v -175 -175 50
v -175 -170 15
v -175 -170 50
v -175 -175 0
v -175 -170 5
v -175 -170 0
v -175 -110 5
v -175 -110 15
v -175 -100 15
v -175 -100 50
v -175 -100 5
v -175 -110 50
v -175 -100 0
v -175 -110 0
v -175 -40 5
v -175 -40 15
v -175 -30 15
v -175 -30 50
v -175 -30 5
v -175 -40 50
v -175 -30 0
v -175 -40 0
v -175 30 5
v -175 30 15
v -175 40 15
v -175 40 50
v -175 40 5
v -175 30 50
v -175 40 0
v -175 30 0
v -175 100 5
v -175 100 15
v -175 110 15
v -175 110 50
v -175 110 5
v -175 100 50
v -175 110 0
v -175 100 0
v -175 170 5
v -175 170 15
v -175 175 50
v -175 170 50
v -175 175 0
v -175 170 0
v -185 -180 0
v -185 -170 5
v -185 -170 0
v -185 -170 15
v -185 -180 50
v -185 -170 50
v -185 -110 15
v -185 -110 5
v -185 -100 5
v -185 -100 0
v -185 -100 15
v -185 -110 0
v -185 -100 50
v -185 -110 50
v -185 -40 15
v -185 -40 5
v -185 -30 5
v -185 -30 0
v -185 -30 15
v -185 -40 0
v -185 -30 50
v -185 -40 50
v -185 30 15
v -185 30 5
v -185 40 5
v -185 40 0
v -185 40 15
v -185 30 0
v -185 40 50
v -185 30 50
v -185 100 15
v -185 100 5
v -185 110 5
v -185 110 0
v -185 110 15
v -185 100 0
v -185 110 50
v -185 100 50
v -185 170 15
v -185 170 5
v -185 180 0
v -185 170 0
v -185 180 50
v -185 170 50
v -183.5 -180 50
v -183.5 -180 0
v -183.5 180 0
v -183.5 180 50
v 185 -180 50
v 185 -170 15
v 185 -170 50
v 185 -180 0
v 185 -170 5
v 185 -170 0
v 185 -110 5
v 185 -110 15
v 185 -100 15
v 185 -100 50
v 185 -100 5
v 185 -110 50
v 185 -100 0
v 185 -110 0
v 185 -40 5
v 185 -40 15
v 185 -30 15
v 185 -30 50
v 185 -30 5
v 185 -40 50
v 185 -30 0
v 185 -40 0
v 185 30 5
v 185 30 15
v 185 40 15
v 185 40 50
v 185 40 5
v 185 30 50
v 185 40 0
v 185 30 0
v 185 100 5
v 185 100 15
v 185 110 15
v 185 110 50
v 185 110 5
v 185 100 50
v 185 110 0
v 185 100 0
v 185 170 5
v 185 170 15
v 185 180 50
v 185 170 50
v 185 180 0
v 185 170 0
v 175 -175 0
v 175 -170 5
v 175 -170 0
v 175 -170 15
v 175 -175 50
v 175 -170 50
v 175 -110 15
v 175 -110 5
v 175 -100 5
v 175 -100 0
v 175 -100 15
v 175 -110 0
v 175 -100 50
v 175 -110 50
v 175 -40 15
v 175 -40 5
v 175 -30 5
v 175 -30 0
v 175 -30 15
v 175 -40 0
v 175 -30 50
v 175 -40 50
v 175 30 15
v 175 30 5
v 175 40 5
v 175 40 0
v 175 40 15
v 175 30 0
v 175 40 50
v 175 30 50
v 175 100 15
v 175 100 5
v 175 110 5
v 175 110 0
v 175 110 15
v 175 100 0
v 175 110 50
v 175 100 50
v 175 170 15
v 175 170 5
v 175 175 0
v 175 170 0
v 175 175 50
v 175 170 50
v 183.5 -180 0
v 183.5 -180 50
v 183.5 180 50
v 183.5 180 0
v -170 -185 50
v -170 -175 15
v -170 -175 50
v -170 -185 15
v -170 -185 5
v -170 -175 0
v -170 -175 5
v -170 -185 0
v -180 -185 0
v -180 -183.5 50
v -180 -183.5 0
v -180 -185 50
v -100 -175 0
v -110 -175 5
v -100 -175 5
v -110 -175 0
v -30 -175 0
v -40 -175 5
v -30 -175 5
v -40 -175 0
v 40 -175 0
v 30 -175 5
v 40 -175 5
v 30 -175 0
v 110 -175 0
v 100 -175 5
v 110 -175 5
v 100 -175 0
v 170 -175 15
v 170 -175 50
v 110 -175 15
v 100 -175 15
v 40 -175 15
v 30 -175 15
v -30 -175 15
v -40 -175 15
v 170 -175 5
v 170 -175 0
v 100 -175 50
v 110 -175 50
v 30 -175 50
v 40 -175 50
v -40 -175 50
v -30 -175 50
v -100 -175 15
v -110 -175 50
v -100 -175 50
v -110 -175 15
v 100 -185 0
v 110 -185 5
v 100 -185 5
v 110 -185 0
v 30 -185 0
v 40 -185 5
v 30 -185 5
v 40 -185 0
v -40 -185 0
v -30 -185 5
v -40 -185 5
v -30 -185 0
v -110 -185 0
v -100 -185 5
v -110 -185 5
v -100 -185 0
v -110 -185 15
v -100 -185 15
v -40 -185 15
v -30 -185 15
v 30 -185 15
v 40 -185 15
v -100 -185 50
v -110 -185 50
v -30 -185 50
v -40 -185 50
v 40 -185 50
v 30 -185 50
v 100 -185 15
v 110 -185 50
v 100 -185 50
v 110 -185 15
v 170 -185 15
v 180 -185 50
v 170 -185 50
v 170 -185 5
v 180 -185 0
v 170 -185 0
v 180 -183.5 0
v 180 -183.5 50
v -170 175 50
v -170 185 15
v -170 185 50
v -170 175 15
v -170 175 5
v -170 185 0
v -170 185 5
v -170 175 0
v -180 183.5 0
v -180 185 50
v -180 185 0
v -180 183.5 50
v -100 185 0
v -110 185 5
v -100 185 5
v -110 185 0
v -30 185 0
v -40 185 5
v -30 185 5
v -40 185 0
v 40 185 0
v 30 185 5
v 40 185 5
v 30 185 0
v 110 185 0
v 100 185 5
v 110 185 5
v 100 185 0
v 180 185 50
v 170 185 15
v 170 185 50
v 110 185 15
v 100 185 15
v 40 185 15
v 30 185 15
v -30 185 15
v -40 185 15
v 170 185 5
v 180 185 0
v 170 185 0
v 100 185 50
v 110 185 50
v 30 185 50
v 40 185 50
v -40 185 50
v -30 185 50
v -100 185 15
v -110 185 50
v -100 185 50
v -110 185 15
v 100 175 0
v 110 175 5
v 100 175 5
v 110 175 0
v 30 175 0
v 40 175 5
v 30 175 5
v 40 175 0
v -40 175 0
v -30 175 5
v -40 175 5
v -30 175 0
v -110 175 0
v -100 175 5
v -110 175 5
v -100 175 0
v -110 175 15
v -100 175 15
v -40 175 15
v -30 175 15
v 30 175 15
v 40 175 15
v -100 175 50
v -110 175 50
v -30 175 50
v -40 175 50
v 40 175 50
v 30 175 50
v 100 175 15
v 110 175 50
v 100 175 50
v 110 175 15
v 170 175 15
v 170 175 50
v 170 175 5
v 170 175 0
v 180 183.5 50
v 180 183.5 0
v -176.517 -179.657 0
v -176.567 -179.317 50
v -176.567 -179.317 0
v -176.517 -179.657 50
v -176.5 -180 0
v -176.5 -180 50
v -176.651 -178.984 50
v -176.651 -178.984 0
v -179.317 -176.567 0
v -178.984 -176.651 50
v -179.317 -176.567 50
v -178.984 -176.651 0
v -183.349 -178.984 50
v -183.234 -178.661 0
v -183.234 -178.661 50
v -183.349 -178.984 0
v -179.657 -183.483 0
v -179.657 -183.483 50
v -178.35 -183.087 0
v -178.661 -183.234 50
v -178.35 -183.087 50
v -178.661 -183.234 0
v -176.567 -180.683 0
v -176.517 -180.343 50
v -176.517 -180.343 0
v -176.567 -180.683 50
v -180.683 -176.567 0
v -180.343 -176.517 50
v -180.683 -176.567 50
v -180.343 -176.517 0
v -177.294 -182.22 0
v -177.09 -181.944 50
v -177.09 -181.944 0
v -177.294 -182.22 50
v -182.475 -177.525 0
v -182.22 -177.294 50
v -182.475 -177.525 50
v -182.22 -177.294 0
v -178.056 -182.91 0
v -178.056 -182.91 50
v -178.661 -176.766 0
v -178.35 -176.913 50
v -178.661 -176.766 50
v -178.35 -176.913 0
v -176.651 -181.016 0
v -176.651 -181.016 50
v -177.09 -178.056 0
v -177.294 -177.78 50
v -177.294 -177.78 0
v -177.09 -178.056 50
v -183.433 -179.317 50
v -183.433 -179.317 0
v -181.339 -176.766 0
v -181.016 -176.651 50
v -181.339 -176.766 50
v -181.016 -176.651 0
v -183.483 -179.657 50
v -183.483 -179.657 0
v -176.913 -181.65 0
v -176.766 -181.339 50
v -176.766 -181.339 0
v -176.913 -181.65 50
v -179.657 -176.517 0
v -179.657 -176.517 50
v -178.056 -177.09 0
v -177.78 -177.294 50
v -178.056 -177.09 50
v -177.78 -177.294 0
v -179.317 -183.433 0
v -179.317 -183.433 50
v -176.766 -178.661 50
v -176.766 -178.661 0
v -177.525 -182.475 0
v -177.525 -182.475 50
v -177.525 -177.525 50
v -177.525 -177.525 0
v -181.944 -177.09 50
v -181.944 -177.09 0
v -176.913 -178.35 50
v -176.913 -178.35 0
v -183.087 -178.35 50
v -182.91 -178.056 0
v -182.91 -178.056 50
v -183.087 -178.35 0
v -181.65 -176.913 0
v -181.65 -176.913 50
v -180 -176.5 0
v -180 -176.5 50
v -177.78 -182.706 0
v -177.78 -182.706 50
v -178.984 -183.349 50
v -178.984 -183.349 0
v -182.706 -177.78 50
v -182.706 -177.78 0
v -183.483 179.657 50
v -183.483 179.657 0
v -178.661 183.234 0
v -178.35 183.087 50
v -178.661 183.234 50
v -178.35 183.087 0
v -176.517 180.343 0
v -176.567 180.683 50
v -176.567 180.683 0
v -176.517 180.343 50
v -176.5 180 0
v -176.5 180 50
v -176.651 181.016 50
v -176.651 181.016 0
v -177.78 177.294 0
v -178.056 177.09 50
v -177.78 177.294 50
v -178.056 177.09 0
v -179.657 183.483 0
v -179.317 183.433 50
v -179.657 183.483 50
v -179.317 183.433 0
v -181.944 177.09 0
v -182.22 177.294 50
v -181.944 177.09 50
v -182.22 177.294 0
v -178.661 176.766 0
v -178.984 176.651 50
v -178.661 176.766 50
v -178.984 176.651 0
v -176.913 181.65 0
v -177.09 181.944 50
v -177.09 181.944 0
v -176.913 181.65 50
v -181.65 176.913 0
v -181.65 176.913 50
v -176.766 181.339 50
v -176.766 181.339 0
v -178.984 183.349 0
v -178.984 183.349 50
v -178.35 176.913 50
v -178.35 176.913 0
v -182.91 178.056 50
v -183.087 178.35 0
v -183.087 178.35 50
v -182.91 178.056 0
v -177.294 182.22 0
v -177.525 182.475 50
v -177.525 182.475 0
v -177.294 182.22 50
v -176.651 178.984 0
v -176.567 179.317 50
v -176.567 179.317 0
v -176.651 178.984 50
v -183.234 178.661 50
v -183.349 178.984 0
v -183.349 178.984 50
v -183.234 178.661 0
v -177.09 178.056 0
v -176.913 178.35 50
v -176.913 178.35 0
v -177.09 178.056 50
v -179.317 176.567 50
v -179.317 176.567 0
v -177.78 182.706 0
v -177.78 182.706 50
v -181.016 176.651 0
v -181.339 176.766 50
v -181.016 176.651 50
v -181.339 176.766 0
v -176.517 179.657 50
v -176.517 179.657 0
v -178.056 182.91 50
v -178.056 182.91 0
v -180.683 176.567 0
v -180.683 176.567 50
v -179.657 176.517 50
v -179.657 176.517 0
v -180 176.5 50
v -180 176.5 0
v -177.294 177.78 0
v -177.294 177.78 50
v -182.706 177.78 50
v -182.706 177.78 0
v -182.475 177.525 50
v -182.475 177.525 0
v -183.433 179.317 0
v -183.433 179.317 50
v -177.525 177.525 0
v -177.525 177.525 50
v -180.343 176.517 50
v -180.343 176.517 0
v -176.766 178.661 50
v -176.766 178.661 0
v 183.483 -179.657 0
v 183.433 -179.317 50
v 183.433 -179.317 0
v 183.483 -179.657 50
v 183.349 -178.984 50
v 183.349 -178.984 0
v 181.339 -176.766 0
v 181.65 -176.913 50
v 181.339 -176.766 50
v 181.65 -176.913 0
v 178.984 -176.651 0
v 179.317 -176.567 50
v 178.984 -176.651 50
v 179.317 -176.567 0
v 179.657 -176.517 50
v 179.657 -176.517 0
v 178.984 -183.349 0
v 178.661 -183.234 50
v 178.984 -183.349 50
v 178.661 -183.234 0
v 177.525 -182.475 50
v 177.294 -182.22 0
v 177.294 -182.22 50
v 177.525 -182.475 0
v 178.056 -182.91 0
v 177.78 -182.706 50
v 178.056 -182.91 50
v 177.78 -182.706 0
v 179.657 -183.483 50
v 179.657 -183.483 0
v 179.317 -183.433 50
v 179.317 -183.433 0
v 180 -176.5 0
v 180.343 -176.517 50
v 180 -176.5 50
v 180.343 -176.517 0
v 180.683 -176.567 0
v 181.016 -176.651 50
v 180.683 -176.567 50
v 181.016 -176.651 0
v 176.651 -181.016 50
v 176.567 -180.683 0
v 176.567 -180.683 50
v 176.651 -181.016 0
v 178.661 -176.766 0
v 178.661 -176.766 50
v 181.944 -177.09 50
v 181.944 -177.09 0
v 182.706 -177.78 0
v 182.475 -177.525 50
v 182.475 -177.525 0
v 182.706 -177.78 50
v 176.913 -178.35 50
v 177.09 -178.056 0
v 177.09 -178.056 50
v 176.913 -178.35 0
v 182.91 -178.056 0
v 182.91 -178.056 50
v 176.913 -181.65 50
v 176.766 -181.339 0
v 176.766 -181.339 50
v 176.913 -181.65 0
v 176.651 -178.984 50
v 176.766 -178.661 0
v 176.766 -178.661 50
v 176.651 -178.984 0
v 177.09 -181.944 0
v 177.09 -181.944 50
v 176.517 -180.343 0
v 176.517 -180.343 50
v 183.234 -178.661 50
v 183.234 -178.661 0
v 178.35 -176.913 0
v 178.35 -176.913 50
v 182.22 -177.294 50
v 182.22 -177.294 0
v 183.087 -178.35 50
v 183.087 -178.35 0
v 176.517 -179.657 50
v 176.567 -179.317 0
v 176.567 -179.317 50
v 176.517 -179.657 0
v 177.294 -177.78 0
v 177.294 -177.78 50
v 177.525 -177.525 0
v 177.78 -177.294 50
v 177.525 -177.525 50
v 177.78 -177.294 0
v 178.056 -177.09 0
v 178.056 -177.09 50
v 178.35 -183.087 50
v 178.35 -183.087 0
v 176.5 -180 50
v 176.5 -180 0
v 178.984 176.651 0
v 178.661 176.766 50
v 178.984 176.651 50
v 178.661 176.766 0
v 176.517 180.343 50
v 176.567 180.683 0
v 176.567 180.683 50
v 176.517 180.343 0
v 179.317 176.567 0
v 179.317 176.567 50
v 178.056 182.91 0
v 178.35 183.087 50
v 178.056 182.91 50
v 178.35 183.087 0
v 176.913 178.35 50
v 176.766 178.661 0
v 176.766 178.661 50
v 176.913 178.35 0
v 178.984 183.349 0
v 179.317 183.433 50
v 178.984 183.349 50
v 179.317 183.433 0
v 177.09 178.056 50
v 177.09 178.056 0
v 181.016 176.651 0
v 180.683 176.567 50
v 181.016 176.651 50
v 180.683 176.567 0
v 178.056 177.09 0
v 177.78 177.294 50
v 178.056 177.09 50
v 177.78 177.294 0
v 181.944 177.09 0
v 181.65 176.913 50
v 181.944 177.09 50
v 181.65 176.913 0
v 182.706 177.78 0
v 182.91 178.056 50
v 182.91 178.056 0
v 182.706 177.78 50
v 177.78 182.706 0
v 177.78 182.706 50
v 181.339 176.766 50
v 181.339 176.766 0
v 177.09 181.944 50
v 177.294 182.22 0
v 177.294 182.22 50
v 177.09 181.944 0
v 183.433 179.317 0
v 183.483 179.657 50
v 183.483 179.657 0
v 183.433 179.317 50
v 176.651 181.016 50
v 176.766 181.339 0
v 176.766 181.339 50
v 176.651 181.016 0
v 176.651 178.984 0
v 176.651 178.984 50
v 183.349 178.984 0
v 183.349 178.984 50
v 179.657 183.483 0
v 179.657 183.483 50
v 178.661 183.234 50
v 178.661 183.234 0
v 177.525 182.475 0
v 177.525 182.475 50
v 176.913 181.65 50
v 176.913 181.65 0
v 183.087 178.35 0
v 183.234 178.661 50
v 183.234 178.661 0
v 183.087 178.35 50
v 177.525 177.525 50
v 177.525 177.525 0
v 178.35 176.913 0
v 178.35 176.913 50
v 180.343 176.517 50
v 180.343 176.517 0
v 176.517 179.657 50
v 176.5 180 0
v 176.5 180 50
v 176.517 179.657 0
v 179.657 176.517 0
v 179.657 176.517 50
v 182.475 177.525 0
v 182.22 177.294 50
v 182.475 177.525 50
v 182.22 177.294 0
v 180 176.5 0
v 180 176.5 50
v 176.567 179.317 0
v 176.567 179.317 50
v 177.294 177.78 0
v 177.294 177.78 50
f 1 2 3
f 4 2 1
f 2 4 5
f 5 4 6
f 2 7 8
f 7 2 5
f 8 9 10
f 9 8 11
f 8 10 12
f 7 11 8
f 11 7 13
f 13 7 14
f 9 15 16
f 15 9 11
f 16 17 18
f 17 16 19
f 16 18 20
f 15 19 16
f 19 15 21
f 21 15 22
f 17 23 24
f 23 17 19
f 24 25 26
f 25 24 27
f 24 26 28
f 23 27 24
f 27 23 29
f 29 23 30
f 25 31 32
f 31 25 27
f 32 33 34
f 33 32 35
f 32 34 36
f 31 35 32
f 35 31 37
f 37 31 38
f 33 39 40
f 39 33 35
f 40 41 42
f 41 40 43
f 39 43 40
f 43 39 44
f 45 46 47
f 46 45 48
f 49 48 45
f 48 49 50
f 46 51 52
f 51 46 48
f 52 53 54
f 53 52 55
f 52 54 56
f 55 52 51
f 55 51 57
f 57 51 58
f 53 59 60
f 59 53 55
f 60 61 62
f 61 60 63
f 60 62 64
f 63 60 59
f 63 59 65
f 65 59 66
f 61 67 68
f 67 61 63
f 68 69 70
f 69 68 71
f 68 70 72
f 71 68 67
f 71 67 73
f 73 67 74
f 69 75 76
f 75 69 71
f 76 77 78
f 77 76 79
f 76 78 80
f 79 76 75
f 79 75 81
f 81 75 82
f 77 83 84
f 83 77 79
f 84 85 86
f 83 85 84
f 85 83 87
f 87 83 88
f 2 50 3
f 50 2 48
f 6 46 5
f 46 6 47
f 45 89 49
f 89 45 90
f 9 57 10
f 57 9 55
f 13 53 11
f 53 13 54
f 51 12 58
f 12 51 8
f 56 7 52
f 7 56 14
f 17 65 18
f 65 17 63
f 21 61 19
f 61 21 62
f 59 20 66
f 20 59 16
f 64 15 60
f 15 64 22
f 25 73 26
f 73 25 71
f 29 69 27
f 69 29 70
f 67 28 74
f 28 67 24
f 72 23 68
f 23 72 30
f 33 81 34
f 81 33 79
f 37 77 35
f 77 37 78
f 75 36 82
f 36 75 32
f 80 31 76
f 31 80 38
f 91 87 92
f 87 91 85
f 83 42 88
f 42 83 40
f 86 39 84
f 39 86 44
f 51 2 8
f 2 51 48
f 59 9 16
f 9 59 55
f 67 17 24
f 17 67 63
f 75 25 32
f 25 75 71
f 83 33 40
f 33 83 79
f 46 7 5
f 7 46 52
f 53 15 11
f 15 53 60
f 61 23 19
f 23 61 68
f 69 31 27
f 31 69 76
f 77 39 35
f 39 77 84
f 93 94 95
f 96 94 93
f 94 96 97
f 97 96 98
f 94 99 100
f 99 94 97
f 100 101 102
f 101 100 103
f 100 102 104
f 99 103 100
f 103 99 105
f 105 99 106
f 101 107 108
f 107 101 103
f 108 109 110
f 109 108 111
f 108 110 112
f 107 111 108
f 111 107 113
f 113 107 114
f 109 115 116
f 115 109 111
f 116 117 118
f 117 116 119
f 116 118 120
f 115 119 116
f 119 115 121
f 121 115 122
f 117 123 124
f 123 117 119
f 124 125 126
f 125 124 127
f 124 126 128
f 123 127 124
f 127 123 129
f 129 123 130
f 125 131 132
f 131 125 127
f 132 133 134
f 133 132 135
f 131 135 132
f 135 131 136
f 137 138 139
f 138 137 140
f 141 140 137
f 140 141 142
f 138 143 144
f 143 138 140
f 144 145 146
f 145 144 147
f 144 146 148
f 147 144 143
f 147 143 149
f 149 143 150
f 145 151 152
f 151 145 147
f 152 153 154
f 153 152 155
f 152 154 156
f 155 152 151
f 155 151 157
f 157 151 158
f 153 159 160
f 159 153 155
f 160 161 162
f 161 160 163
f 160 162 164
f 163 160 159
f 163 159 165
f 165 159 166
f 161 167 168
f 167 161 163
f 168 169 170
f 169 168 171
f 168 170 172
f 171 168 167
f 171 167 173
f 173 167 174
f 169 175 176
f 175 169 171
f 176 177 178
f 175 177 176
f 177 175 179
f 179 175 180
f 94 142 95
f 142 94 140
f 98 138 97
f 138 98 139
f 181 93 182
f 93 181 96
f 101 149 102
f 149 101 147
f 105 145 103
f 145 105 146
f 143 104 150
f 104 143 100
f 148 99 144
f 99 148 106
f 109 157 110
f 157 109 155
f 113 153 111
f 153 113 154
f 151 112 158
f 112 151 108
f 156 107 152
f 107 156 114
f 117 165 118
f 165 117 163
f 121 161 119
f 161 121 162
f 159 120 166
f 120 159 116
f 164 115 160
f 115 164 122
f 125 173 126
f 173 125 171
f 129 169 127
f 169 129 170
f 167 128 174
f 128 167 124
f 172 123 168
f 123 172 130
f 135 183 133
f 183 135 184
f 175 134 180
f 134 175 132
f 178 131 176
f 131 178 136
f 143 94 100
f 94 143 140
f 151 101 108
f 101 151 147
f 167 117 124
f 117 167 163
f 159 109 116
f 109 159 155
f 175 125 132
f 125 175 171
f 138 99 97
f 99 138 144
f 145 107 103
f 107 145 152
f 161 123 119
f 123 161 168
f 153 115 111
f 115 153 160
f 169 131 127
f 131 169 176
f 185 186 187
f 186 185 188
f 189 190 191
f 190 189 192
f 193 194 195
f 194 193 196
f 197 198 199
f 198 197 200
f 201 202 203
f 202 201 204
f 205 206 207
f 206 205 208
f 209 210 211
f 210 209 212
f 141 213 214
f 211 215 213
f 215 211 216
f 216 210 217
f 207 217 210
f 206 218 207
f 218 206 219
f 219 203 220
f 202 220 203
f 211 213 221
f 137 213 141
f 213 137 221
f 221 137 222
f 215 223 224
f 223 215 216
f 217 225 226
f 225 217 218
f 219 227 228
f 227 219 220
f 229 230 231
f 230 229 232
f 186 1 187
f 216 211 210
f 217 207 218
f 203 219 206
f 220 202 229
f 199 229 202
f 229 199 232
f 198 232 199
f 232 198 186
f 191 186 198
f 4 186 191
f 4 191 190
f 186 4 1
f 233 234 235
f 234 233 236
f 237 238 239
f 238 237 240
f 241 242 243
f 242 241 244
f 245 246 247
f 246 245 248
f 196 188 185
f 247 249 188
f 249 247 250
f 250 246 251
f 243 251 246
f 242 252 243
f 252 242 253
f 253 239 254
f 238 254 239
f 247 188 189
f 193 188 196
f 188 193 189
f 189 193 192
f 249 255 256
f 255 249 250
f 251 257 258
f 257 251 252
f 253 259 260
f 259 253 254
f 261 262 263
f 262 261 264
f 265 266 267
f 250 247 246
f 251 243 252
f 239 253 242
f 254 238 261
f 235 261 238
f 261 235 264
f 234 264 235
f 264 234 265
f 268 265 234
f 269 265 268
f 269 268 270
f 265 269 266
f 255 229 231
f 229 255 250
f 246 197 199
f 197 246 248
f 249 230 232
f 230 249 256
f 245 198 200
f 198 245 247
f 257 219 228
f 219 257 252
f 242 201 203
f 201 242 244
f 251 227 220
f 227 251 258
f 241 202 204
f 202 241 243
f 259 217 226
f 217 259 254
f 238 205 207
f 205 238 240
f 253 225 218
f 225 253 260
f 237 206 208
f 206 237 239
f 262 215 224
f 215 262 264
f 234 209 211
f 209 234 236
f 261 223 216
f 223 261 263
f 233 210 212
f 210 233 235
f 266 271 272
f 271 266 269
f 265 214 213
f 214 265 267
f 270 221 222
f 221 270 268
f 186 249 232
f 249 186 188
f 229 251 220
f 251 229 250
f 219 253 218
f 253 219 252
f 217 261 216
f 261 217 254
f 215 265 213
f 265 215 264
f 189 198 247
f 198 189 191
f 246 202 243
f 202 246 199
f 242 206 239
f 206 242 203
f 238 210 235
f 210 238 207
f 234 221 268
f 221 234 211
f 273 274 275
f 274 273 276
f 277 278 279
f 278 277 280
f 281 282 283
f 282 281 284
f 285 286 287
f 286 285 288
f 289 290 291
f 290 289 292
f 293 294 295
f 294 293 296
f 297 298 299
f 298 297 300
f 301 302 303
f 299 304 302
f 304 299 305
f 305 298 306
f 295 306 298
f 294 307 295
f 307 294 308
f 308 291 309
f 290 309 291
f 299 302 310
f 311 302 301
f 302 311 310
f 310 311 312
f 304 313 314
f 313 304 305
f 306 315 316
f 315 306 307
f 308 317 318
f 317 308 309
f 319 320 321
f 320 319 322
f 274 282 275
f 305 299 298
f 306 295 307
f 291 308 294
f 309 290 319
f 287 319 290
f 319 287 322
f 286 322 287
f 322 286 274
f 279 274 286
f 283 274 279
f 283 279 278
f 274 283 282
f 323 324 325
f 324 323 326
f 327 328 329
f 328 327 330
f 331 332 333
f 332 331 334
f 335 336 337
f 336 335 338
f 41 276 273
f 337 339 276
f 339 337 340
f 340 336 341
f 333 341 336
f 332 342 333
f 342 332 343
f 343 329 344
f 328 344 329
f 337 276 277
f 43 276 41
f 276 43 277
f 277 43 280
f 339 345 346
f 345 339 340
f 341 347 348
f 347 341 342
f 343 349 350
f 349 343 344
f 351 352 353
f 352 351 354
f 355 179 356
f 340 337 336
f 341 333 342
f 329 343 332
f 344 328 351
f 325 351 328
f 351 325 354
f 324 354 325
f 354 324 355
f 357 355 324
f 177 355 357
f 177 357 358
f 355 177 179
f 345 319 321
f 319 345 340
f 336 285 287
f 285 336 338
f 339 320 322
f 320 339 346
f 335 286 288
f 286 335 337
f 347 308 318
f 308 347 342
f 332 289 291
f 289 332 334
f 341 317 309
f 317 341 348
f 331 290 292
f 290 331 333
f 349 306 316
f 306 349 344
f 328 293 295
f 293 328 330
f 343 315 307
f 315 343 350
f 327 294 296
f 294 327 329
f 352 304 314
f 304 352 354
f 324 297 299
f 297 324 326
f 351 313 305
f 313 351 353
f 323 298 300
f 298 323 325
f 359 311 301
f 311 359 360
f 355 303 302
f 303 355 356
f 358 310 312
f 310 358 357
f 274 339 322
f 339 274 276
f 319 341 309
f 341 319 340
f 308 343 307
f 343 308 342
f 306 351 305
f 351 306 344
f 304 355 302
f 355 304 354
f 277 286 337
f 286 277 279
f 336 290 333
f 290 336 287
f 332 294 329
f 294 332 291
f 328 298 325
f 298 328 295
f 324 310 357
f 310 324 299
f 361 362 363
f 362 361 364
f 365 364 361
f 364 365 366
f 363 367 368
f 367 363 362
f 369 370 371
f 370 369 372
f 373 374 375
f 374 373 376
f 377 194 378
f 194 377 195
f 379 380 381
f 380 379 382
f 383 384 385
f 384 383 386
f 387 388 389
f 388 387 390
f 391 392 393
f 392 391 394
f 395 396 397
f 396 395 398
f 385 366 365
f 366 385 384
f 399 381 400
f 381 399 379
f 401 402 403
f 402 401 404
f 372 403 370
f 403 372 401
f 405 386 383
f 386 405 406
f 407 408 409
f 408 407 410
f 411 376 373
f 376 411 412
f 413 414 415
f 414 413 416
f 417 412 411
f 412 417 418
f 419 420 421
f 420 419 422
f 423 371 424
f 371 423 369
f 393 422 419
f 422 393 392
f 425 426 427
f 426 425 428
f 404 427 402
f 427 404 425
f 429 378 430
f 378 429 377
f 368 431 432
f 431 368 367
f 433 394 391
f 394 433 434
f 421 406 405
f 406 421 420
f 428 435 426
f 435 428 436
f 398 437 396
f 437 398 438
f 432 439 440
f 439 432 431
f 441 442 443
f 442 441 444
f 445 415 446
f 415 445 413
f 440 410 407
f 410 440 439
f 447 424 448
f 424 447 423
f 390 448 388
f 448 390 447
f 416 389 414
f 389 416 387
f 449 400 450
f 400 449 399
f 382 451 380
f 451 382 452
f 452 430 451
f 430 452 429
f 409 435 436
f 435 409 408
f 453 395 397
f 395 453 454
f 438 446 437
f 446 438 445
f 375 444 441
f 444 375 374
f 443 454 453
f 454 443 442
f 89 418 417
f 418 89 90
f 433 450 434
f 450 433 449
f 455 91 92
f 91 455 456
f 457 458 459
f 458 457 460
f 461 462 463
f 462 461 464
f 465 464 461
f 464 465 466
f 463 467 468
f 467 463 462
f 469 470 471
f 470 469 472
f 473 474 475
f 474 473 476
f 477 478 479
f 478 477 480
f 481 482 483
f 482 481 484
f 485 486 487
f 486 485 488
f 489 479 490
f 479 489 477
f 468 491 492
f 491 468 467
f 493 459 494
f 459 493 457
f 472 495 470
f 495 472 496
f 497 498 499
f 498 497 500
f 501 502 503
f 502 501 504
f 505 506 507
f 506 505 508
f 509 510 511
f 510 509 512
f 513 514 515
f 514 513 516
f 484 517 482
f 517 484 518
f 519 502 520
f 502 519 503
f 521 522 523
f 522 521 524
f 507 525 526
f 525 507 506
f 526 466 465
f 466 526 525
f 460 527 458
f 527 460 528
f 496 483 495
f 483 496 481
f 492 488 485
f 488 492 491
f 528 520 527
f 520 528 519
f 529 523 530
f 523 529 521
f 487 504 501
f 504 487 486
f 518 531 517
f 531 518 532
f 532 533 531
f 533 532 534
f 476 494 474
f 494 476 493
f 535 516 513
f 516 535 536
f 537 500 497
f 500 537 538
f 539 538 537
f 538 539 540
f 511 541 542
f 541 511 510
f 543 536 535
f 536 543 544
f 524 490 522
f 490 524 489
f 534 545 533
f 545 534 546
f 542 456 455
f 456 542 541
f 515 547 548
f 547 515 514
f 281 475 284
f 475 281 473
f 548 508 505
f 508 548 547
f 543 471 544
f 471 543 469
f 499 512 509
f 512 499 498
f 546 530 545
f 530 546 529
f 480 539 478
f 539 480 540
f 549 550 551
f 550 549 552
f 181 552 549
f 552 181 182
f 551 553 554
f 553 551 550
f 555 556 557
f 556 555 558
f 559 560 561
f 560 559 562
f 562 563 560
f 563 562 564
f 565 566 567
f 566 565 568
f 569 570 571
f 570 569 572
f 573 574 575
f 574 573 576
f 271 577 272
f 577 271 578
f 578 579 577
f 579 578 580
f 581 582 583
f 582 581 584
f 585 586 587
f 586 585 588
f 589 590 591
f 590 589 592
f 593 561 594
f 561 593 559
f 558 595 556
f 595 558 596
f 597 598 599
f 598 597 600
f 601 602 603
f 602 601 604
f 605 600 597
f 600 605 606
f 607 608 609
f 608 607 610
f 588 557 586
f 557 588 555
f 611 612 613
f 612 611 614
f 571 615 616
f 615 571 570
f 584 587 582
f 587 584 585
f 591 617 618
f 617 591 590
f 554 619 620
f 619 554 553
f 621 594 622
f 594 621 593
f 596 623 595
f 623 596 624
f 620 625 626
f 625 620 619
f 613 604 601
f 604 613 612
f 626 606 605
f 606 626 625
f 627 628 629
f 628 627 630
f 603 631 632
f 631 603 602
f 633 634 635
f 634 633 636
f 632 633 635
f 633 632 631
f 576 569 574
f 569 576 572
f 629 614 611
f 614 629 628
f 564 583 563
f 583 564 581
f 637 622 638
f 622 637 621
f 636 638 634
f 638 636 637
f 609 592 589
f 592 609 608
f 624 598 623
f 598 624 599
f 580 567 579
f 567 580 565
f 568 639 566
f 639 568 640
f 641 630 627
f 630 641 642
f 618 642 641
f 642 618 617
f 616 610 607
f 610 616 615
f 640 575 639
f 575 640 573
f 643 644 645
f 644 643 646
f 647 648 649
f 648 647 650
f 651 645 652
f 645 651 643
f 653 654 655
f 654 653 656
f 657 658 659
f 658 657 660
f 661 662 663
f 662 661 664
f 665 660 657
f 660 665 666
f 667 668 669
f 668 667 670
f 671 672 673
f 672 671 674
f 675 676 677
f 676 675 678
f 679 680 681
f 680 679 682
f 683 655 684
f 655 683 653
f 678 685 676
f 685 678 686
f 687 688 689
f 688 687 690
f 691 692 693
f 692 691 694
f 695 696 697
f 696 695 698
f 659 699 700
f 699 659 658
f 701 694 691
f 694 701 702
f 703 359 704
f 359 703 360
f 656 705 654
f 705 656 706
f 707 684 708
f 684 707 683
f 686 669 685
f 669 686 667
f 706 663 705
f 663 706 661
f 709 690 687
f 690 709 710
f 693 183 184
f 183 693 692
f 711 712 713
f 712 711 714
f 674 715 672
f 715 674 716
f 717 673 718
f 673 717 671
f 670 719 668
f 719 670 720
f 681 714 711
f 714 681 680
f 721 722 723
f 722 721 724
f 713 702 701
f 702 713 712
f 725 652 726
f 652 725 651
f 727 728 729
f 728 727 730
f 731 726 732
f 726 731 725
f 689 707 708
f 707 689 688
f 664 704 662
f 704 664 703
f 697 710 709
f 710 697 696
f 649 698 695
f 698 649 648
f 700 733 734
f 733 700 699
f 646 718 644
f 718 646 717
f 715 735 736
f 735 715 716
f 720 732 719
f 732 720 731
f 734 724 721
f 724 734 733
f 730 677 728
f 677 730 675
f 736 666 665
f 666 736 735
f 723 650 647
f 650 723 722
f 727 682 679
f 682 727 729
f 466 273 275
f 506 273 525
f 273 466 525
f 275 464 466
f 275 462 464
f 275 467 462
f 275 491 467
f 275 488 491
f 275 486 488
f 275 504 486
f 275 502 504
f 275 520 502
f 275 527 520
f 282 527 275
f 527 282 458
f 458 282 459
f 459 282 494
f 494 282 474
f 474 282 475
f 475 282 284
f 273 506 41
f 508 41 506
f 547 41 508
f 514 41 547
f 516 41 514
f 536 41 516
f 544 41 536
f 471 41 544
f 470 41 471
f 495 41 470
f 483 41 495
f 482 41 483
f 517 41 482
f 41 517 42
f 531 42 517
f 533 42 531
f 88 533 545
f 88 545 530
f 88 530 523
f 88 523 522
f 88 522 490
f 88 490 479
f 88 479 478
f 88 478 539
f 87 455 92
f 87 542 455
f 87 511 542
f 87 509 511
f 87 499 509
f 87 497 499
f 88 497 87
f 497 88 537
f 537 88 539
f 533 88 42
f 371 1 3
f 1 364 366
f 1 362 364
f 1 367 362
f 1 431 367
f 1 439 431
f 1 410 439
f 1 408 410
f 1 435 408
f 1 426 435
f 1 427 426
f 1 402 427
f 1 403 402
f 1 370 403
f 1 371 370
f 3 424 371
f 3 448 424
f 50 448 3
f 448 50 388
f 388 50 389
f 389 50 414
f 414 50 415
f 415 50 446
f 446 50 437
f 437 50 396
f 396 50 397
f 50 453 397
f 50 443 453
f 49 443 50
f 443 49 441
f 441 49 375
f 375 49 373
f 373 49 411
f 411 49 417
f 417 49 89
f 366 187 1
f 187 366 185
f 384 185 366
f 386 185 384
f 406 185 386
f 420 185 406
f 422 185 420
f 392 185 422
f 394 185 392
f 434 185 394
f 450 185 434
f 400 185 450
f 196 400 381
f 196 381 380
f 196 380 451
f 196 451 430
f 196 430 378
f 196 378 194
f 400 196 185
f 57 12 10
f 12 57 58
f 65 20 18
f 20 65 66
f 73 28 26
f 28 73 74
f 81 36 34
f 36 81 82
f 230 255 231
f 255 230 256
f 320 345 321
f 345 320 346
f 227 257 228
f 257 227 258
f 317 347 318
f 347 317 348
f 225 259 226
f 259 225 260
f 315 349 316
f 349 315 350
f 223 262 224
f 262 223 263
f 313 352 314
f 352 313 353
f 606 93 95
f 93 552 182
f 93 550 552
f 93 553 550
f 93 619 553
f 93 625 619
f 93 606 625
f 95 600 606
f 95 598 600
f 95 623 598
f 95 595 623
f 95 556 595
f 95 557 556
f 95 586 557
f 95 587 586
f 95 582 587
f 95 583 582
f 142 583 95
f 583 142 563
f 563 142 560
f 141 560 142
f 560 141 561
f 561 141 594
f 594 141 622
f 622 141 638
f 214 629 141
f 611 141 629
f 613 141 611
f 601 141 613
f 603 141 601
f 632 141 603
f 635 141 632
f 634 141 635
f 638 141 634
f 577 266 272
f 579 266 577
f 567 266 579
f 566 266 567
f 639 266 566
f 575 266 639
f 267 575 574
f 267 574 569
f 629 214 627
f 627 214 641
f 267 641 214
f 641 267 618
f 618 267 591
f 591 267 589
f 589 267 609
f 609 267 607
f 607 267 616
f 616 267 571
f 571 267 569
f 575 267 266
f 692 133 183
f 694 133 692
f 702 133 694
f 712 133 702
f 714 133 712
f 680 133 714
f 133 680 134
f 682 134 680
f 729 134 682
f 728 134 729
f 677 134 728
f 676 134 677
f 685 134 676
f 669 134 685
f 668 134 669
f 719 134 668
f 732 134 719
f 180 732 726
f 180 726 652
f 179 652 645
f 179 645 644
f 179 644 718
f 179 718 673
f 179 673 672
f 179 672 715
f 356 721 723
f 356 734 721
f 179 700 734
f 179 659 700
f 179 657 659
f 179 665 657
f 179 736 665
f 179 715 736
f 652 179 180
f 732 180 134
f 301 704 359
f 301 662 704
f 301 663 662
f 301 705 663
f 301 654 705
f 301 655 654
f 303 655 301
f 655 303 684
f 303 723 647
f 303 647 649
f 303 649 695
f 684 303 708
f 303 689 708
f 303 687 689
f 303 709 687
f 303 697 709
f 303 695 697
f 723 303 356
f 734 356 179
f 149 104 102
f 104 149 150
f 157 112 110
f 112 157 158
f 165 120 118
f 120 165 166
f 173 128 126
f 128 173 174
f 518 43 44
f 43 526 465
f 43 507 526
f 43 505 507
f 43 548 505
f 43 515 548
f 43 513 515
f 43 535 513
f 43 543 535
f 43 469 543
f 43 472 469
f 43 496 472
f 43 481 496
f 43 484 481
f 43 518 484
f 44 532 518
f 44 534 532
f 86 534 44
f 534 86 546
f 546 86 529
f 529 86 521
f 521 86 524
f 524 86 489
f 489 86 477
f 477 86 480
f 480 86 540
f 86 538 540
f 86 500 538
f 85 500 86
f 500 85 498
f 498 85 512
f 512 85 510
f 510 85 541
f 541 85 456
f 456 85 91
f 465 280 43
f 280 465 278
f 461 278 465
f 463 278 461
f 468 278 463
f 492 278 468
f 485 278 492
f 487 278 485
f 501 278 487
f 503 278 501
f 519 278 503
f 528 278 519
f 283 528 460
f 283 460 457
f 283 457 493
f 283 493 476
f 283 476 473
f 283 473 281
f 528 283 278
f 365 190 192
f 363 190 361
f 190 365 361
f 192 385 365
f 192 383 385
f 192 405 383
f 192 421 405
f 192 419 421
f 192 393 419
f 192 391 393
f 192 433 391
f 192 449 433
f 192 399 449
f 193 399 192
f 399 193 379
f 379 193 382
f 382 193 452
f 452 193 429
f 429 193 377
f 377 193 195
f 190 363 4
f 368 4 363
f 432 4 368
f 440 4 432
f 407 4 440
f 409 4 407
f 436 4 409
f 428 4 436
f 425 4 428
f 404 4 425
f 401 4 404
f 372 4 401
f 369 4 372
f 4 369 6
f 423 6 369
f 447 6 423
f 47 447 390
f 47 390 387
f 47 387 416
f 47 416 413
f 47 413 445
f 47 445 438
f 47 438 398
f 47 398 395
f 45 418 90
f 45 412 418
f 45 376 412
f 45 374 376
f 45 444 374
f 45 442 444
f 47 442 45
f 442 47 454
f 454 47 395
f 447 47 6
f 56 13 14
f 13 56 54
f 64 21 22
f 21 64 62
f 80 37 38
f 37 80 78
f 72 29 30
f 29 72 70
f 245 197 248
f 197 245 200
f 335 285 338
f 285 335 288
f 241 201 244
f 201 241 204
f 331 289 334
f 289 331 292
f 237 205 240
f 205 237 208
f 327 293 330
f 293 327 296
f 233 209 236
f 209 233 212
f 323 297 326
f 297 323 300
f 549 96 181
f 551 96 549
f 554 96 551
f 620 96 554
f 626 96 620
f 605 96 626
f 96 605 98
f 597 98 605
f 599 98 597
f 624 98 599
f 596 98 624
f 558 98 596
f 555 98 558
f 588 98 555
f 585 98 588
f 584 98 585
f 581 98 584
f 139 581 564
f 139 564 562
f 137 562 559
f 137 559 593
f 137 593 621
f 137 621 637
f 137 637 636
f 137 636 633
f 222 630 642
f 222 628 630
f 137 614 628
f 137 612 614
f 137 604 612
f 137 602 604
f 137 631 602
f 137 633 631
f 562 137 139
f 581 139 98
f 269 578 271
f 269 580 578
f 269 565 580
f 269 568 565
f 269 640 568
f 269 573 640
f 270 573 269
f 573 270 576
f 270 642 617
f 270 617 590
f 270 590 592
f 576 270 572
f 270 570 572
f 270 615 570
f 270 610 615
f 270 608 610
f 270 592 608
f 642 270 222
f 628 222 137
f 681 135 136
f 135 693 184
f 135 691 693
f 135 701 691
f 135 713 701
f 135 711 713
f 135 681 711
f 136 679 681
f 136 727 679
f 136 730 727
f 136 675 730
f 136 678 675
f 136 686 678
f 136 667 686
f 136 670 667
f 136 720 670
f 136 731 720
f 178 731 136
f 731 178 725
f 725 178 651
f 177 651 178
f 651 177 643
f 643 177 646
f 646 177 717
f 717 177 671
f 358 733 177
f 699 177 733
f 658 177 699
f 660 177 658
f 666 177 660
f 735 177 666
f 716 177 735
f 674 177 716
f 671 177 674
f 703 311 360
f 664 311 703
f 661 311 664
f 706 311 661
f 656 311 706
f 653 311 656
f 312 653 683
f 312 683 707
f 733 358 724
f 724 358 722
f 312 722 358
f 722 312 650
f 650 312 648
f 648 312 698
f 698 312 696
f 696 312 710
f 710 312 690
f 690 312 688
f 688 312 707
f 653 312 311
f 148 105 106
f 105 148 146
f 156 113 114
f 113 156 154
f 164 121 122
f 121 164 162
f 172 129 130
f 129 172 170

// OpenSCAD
/*
  Cage slice 08 of 15
*/

bar = 10;
half_inner = 175;
gap = 70;
rod_d = 7;
half_outer = half_inner + bar;

function grid_pos(n) = -half_inner + n * gap;

module cage_full() {
  difference() {
    union() {
      // Floor grid at z = -10 .. 0
      for (j = [0:5]) {
        y = grid_pos(j);
        translate([-half_inner, y - bar/2, -bar])
          cube([2*half_inner, bar, bar], center=false);
      }
      for (i = [0:5]) {
        x = grid_pos(i);
        translate([x - bar/2, -half_inner, -bar])
          cube([bar, 2*half_inner, bar], center=false);
      }

      // Roof grid at z = 700 .. 710
      for (j = [0:5]) {
        y = grid_pos(j);
        translate([-half_inner, y - bar/2, 700])
          cube([2*half_inner, bar, bar], center=false);
      }
      for (i = [0:5]) {
        x = grid_pos(i);
        translate([x - bar/2, -half_inner, 700])
          cube([bar, 2*half_inner, bar], center=false);
      }

      // Side walls at x = ±175
      for (side = [-1, 1]) {
        sx = side * half_inner;
        x0 = (side == 1) ? sx : sx - bar;
        for (j = [0:5]) {
          y = grid_pos(j);
          translate([x0, y - bar/2, 0])
            cube([bar, bar, 700], center=false);
        }
        for (k = [0:10]) {
          zc = 0 + k * gap;
          translate([x0, -half_inner, zc - bar/2])
            cube([bar, 2*half_inner, bar], center=false);
        }
      }

      // Front/back walls at y = ±175
      for (side = [-1, 1]) {
        sy = side * half_inner;
        y0 = (side == 1) ? sy : sy - bar;
        for (i = [0:5]) {
          x = grid_pos(i);
          translate([x - bar/2, y0, 0])
            cube([bar, bar, 700], center=false);
        }
        for (k = [0:10]) {
          zc = 0 + k * gap;
          translate([-half_inner, y0, zc - bar/2])
            cube([2*half_inner, bar, bar], center=false);
        }
      }
    }

    for (sx = [-1, 1], sy = [-1, 1]) {
      translate([sx * (half_inner + bar/2),
                 sy * (half_inner + bar/2),
                 -20])
        cylinder(d = rod_d, h = 740, $fn = 64);
    }
  }
}

z_min = 340;
z_max = 390;  // height 50 mm

module slice() {
  intersection() {
    cage_full();
    translate([-half_outer - 5, -half_outer - 5, z_min])
      cube([2*(half_outer + 5), 2*(half_outer + 5), z_max - z_min], center=false);
  }
}

translate([0, 0, -z_min])
  slice();
